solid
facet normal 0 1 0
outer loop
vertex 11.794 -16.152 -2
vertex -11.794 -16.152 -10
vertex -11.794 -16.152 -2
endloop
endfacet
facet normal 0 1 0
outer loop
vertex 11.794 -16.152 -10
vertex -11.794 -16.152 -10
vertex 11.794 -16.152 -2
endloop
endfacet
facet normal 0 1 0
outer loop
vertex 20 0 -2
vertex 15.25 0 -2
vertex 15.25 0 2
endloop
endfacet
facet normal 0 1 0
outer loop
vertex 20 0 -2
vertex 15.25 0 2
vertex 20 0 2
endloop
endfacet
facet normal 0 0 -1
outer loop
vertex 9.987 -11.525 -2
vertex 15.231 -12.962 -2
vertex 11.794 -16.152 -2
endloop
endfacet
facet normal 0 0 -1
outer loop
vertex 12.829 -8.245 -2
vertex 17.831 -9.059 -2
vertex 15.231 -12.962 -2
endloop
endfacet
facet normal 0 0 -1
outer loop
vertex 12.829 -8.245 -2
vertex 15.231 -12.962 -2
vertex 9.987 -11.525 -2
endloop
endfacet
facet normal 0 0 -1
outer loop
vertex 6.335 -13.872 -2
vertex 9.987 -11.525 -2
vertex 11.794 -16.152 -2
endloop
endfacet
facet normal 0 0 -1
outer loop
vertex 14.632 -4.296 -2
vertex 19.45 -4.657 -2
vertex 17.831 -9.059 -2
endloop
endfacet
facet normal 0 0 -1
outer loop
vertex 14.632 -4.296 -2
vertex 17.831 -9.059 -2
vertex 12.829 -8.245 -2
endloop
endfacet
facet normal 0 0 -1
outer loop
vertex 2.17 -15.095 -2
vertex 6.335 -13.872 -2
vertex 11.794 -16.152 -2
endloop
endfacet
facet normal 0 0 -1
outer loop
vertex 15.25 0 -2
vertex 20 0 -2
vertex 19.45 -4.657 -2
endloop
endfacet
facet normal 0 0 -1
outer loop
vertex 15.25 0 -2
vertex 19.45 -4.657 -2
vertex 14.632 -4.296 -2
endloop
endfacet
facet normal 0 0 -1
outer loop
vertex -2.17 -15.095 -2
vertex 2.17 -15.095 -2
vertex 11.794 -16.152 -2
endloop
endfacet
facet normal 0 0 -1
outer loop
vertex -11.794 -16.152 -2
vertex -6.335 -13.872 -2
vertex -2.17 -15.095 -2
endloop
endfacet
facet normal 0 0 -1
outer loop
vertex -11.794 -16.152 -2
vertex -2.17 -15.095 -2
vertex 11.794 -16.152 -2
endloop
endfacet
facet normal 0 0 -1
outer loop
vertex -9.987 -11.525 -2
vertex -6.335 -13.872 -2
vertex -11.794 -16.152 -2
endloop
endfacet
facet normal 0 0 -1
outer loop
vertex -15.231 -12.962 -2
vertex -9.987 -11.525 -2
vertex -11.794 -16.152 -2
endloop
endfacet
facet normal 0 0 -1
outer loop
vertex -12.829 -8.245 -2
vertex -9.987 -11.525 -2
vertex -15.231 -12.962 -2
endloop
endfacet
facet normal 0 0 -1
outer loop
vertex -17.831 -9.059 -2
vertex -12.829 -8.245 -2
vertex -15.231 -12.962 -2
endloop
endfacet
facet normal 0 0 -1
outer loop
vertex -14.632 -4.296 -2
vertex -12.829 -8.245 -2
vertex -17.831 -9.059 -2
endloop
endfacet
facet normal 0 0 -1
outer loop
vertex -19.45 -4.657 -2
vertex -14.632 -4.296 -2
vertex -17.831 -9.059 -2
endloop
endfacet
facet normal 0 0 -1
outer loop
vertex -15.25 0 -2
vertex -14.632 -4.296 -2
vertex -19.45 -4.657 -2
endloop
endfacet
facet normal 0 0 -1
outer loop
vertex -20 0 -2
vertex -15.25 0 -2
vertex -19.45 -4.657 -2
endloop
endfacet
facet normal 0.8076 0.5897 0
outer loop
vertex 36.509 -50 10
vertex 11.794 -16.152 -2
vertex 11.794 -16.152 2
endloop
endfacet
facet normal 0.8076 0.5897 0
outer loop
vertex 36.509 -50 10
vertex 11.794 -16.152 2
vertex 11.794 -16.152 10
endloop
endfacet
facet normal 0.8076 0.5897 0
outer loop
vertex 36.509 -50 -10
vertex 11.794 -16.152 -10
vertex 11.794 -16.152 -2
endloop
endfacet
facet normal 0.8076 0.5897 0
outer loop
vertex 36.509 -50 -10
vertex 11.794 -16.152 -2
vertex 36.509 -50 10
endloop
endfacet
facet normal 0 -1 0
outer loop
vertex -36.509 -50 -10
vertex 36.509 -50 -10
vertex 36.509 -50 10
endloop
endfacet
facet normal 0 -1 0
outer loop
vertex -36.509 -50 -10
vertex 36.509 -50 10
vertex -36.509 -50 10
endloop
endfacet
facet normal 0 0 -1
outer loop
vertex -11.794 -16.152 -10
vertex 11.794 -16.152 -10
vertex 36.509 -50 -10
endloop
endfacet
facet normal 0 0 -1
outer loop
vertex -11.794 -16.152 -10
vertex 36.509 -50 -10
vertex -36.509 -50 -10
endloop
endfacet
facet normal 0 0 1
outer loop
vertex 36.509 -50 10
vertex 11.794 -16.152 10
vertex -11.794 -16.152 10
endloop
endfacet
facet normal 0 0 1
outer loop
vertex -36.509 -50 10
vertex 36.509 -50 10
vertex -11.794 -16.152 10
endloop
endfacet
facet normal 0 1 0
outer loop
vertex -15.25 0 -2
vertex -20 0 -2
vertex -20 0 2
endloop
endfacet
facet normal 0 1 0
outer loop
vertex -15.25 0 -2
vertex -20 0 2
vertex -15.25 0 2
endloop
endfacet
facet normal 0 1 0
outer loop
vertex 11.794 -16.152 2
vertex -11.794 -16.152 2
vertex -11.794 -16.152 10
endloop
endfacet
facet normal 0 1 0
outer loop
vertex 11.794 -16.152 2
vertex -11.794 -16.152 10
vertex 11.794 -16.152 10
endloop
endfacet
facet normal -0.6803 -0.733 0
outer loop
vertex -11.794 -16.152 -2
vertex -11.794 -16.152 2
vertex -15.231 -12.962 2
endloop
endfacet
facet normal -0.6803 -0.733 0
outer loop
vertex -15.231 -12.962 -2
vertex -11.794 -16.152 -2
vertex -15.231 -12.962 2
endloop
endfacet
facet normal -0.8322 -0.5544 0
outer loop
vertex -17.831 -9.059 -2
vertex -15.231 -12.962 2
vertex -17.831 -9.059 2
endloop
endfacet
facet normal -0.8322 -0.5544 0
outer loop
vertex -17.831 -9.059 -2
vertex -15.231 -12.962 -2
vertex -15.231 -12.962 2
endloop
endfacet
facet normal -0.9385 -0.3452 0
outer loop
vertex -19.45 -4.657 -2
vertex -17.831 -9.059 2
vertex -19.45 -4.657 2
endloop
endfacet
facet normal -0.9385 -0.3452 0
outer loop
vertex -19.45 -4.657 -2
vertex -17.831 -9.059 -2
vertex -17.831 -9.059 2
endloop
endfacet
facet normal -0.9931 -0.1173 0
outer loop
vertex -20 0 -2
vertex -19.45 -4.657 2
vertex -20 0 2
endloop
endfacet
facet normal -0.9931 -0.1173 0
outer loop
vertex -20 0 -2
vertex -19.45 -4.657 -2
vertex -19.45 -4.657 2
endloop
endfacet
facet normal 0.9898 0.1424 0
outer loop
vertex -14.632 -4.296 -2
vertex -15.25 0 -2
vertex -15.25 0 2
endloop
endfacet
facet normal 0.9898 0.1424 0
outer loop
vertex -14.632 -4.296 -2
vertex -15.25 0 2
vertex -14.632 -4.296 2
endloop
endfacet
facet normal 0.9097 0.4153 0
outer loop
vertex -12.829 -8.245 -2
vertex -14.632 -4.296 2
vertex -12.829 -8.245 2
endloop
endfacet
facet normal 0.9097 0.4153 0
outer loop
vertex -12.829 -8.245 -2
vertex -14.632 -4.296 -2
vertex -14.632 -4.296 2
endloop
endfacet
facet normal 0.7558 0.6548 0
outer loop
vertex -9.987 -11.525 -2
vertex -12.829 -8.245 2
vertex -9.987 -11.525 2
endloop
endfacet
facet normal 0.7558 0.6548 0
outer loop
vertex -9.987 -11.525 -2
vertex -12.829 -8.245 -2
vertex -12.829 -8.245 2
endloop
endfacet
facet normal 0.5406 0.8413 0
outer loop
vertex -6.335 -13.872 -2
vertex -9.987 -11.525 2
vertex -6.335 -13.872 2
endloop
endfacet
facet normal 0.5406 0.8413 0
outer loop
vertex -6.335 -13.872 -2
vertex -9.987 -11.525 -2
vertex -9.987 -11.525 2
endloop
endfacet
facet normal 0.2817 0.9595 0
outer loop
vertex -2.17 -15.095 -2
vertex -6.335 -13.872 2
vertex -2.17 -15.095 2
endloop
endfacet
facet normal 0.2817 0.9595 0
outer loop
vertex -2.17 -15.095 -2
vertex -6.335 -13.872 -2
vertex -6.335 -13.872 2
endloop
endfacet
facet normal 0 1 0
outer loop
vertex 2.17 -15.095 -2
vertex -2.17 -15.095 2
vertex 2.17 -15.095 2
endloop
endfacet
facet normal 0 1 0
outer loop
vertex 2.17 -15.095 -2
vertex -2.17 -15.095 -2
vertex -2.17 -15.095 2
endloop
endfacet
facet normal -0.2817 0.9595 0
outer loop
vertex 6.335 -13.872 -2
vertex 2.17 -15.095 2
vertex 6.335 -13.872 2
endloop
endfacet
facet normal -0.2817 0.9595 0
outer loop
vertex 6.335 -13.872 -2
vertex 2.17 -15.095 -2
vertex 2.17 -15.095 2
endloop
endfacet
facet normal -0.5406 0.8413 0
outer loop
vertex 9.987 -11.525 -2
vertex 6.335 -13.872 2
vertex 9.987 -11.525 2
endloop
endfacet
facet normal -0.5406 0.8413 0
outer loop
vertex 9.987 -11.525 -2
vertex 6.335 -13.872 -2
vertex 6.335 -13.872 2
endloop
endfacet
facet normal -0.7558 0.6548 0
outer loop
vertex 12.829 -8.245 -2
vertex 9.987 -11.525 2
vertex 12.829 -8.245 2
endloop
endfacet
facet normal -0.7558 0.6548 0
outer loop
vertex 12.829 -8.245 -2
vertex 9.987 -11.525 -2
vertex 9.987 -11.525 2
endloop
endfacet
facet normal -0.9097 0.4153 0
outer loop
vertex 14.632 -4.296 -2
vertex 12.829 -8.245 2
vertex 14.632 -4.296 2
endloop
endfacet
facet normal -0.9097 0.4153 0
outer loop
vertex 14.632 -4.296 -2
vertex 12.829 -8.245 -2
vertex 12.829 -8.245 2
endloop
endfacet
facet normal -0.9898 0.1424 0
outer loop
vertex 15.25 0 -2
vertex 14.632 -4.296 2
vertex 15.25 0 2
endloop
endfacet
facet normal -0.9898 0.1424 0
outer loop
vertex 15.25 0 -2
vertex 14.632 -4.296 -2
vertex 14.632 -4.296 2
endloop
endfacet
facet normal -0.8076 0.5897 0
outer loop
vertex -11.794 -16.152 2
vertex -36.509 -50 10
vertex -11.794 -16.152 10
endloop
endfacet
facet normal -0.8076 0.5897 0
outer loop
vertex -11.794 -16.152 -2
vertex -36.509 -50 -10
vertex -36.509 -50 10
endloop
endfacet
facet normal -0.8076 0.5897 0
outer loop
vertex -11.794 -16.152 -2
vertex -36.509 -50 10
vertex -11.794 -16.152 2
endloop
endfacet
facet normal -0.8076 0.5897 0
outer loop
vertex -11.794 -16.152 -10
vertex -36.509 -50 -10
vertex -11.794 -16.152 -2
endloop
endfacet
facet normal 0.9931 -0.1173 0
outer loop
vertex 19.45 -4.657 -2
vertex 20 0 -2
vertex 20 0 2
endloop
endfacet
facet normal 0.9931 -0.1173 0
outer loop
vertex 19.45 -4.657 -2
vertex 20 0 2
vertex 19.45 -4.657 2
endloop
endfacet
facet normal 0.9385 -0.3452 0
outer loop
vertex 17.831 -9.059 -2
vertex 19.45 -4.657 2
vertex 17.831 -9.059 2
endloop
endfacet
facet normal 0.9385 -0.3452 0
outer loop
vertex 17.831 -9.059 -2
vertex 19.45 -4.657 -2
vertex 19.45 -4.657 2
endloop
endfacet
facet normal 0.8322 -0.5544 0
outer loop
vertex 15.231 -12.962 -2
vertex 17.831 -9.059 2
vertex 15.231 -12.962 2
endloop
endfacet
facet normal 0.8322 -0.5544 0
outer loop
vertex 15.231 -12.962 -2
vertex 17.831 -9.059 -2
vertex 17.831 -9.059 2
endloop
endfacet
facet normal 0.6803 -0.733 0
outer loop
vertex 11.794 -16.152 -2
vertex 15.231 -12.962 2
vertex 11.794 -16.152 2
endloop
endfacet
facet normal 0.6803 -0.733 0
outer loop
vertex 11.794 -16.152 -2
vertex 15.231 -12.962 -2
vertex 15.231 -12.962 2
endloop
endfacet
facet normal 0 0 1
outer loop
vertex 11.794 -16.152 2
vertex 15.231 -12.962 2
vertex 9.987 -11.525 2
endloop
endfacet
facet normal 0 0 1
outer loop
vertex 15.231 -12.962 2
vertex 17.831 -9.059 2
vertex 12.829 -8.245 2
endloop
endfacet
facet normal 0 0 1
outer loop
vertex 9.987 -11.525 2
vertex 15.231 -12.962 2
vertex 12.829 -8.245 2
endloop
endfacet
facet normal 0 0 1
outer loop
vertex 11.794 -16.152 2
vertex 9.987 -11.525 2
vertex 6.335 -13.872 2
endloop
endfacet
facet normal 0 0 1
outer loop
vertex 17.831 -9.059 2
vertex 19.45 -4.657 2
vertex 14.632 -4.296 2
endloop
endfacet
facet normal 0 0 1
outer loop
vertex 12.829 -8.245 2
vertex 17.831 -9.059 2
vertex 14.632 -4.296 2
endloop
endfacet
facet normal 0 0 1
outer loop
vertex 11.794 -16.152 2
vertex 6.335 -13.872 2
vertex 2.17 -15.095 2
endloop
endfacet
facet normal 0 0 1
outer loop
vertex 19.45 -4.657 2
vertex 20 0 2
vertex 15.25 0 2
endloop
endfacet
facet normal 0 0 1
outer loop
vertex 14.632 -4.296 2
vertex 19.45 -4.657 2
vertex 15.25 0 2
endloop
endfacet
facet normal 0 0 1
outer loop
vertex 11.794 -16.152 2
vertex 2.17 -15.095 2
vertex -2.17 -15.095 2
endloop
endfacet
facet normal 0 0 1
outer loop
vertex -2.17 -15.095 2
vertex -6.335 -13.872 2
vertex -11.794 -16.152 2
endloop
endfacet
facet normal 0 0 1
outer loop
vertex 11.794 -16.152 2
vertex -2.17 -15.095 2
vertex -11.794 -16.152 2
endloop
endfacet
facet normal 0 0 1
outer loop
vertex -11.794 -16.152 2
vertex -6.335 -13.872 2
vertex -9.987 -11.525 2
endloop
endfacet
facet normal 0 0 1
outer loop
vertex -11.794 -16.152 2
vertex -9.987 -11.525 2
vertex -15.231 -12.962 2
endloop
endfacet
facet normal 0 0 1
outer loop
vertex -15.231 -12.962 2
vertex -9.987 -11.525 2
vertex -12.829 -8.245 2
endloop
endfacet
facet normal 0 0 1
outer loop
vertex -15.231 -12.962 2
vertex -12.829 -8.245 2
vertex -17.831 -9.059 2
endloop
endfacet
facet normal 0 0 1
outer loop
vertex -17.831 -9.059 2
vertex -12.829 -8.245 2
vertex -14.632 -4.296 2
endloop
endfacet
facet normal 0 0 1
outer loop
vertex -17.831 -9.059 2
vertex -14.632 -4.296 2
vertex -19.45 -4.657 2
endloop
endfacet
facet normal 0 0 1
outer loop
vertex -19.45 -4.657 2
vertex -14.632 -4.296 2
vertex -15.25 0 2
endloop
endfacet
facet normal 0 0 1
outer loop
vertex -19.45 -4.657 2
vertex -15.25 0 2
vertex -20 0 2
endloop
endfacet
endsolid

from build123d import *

# Parameters (mm, degrees)
BOSS_EXTRU_1_DEPTH      = 2
BOSS_EXTRU_1_DEPTH_BACK = 2
BOSS_EXTRU_3_DEPTH      = 10
BOSS_EXTRU_3_DEPTH_BACK = 10


with BuildPart() as part:
    # Esquisse1 → Boss.-Extru.1 (new, two sides: drawn at the far end of the back side and taken through both)
    with BuildSketch(Plane.XY.offset(-BOSS_EXTRU_1_DEPTH_BACK)):
        with BuildLine():
            Line((-20, 0), (-15.25, 0))
            ThreePointArc((-15.25, 0), (0, -15.25), (15.25, 0))
            Line((15.25, 0), (20, 0))
            ThreePointArc((20, 0), (0, -20), (-20, 0))
        make_face()
    extrude(amount=BOSS_EXTRU_1_DEPTH + BOSS_EXTRU_1_DEPTH_BACK)

    # Esquisse2 → Boss.-Extru.3 (add, two sides: drawn at the far end of the back side and taken through both)
    with BuildSketch(Plane.XY.offset(-BOSS_EXTRU_3_DEPTH_BACK)):
        Polygon((-11.79408626, -16.152384632), (-36.508808232, -50), (36.508808232, -50), (11.79408626, -16.152384632), align=None)
    extrude(amount=BOSS_EXTRU_3_DEPTH + BOSS_EXTRU_3_DEPTH_BACK)


solid = part.part
